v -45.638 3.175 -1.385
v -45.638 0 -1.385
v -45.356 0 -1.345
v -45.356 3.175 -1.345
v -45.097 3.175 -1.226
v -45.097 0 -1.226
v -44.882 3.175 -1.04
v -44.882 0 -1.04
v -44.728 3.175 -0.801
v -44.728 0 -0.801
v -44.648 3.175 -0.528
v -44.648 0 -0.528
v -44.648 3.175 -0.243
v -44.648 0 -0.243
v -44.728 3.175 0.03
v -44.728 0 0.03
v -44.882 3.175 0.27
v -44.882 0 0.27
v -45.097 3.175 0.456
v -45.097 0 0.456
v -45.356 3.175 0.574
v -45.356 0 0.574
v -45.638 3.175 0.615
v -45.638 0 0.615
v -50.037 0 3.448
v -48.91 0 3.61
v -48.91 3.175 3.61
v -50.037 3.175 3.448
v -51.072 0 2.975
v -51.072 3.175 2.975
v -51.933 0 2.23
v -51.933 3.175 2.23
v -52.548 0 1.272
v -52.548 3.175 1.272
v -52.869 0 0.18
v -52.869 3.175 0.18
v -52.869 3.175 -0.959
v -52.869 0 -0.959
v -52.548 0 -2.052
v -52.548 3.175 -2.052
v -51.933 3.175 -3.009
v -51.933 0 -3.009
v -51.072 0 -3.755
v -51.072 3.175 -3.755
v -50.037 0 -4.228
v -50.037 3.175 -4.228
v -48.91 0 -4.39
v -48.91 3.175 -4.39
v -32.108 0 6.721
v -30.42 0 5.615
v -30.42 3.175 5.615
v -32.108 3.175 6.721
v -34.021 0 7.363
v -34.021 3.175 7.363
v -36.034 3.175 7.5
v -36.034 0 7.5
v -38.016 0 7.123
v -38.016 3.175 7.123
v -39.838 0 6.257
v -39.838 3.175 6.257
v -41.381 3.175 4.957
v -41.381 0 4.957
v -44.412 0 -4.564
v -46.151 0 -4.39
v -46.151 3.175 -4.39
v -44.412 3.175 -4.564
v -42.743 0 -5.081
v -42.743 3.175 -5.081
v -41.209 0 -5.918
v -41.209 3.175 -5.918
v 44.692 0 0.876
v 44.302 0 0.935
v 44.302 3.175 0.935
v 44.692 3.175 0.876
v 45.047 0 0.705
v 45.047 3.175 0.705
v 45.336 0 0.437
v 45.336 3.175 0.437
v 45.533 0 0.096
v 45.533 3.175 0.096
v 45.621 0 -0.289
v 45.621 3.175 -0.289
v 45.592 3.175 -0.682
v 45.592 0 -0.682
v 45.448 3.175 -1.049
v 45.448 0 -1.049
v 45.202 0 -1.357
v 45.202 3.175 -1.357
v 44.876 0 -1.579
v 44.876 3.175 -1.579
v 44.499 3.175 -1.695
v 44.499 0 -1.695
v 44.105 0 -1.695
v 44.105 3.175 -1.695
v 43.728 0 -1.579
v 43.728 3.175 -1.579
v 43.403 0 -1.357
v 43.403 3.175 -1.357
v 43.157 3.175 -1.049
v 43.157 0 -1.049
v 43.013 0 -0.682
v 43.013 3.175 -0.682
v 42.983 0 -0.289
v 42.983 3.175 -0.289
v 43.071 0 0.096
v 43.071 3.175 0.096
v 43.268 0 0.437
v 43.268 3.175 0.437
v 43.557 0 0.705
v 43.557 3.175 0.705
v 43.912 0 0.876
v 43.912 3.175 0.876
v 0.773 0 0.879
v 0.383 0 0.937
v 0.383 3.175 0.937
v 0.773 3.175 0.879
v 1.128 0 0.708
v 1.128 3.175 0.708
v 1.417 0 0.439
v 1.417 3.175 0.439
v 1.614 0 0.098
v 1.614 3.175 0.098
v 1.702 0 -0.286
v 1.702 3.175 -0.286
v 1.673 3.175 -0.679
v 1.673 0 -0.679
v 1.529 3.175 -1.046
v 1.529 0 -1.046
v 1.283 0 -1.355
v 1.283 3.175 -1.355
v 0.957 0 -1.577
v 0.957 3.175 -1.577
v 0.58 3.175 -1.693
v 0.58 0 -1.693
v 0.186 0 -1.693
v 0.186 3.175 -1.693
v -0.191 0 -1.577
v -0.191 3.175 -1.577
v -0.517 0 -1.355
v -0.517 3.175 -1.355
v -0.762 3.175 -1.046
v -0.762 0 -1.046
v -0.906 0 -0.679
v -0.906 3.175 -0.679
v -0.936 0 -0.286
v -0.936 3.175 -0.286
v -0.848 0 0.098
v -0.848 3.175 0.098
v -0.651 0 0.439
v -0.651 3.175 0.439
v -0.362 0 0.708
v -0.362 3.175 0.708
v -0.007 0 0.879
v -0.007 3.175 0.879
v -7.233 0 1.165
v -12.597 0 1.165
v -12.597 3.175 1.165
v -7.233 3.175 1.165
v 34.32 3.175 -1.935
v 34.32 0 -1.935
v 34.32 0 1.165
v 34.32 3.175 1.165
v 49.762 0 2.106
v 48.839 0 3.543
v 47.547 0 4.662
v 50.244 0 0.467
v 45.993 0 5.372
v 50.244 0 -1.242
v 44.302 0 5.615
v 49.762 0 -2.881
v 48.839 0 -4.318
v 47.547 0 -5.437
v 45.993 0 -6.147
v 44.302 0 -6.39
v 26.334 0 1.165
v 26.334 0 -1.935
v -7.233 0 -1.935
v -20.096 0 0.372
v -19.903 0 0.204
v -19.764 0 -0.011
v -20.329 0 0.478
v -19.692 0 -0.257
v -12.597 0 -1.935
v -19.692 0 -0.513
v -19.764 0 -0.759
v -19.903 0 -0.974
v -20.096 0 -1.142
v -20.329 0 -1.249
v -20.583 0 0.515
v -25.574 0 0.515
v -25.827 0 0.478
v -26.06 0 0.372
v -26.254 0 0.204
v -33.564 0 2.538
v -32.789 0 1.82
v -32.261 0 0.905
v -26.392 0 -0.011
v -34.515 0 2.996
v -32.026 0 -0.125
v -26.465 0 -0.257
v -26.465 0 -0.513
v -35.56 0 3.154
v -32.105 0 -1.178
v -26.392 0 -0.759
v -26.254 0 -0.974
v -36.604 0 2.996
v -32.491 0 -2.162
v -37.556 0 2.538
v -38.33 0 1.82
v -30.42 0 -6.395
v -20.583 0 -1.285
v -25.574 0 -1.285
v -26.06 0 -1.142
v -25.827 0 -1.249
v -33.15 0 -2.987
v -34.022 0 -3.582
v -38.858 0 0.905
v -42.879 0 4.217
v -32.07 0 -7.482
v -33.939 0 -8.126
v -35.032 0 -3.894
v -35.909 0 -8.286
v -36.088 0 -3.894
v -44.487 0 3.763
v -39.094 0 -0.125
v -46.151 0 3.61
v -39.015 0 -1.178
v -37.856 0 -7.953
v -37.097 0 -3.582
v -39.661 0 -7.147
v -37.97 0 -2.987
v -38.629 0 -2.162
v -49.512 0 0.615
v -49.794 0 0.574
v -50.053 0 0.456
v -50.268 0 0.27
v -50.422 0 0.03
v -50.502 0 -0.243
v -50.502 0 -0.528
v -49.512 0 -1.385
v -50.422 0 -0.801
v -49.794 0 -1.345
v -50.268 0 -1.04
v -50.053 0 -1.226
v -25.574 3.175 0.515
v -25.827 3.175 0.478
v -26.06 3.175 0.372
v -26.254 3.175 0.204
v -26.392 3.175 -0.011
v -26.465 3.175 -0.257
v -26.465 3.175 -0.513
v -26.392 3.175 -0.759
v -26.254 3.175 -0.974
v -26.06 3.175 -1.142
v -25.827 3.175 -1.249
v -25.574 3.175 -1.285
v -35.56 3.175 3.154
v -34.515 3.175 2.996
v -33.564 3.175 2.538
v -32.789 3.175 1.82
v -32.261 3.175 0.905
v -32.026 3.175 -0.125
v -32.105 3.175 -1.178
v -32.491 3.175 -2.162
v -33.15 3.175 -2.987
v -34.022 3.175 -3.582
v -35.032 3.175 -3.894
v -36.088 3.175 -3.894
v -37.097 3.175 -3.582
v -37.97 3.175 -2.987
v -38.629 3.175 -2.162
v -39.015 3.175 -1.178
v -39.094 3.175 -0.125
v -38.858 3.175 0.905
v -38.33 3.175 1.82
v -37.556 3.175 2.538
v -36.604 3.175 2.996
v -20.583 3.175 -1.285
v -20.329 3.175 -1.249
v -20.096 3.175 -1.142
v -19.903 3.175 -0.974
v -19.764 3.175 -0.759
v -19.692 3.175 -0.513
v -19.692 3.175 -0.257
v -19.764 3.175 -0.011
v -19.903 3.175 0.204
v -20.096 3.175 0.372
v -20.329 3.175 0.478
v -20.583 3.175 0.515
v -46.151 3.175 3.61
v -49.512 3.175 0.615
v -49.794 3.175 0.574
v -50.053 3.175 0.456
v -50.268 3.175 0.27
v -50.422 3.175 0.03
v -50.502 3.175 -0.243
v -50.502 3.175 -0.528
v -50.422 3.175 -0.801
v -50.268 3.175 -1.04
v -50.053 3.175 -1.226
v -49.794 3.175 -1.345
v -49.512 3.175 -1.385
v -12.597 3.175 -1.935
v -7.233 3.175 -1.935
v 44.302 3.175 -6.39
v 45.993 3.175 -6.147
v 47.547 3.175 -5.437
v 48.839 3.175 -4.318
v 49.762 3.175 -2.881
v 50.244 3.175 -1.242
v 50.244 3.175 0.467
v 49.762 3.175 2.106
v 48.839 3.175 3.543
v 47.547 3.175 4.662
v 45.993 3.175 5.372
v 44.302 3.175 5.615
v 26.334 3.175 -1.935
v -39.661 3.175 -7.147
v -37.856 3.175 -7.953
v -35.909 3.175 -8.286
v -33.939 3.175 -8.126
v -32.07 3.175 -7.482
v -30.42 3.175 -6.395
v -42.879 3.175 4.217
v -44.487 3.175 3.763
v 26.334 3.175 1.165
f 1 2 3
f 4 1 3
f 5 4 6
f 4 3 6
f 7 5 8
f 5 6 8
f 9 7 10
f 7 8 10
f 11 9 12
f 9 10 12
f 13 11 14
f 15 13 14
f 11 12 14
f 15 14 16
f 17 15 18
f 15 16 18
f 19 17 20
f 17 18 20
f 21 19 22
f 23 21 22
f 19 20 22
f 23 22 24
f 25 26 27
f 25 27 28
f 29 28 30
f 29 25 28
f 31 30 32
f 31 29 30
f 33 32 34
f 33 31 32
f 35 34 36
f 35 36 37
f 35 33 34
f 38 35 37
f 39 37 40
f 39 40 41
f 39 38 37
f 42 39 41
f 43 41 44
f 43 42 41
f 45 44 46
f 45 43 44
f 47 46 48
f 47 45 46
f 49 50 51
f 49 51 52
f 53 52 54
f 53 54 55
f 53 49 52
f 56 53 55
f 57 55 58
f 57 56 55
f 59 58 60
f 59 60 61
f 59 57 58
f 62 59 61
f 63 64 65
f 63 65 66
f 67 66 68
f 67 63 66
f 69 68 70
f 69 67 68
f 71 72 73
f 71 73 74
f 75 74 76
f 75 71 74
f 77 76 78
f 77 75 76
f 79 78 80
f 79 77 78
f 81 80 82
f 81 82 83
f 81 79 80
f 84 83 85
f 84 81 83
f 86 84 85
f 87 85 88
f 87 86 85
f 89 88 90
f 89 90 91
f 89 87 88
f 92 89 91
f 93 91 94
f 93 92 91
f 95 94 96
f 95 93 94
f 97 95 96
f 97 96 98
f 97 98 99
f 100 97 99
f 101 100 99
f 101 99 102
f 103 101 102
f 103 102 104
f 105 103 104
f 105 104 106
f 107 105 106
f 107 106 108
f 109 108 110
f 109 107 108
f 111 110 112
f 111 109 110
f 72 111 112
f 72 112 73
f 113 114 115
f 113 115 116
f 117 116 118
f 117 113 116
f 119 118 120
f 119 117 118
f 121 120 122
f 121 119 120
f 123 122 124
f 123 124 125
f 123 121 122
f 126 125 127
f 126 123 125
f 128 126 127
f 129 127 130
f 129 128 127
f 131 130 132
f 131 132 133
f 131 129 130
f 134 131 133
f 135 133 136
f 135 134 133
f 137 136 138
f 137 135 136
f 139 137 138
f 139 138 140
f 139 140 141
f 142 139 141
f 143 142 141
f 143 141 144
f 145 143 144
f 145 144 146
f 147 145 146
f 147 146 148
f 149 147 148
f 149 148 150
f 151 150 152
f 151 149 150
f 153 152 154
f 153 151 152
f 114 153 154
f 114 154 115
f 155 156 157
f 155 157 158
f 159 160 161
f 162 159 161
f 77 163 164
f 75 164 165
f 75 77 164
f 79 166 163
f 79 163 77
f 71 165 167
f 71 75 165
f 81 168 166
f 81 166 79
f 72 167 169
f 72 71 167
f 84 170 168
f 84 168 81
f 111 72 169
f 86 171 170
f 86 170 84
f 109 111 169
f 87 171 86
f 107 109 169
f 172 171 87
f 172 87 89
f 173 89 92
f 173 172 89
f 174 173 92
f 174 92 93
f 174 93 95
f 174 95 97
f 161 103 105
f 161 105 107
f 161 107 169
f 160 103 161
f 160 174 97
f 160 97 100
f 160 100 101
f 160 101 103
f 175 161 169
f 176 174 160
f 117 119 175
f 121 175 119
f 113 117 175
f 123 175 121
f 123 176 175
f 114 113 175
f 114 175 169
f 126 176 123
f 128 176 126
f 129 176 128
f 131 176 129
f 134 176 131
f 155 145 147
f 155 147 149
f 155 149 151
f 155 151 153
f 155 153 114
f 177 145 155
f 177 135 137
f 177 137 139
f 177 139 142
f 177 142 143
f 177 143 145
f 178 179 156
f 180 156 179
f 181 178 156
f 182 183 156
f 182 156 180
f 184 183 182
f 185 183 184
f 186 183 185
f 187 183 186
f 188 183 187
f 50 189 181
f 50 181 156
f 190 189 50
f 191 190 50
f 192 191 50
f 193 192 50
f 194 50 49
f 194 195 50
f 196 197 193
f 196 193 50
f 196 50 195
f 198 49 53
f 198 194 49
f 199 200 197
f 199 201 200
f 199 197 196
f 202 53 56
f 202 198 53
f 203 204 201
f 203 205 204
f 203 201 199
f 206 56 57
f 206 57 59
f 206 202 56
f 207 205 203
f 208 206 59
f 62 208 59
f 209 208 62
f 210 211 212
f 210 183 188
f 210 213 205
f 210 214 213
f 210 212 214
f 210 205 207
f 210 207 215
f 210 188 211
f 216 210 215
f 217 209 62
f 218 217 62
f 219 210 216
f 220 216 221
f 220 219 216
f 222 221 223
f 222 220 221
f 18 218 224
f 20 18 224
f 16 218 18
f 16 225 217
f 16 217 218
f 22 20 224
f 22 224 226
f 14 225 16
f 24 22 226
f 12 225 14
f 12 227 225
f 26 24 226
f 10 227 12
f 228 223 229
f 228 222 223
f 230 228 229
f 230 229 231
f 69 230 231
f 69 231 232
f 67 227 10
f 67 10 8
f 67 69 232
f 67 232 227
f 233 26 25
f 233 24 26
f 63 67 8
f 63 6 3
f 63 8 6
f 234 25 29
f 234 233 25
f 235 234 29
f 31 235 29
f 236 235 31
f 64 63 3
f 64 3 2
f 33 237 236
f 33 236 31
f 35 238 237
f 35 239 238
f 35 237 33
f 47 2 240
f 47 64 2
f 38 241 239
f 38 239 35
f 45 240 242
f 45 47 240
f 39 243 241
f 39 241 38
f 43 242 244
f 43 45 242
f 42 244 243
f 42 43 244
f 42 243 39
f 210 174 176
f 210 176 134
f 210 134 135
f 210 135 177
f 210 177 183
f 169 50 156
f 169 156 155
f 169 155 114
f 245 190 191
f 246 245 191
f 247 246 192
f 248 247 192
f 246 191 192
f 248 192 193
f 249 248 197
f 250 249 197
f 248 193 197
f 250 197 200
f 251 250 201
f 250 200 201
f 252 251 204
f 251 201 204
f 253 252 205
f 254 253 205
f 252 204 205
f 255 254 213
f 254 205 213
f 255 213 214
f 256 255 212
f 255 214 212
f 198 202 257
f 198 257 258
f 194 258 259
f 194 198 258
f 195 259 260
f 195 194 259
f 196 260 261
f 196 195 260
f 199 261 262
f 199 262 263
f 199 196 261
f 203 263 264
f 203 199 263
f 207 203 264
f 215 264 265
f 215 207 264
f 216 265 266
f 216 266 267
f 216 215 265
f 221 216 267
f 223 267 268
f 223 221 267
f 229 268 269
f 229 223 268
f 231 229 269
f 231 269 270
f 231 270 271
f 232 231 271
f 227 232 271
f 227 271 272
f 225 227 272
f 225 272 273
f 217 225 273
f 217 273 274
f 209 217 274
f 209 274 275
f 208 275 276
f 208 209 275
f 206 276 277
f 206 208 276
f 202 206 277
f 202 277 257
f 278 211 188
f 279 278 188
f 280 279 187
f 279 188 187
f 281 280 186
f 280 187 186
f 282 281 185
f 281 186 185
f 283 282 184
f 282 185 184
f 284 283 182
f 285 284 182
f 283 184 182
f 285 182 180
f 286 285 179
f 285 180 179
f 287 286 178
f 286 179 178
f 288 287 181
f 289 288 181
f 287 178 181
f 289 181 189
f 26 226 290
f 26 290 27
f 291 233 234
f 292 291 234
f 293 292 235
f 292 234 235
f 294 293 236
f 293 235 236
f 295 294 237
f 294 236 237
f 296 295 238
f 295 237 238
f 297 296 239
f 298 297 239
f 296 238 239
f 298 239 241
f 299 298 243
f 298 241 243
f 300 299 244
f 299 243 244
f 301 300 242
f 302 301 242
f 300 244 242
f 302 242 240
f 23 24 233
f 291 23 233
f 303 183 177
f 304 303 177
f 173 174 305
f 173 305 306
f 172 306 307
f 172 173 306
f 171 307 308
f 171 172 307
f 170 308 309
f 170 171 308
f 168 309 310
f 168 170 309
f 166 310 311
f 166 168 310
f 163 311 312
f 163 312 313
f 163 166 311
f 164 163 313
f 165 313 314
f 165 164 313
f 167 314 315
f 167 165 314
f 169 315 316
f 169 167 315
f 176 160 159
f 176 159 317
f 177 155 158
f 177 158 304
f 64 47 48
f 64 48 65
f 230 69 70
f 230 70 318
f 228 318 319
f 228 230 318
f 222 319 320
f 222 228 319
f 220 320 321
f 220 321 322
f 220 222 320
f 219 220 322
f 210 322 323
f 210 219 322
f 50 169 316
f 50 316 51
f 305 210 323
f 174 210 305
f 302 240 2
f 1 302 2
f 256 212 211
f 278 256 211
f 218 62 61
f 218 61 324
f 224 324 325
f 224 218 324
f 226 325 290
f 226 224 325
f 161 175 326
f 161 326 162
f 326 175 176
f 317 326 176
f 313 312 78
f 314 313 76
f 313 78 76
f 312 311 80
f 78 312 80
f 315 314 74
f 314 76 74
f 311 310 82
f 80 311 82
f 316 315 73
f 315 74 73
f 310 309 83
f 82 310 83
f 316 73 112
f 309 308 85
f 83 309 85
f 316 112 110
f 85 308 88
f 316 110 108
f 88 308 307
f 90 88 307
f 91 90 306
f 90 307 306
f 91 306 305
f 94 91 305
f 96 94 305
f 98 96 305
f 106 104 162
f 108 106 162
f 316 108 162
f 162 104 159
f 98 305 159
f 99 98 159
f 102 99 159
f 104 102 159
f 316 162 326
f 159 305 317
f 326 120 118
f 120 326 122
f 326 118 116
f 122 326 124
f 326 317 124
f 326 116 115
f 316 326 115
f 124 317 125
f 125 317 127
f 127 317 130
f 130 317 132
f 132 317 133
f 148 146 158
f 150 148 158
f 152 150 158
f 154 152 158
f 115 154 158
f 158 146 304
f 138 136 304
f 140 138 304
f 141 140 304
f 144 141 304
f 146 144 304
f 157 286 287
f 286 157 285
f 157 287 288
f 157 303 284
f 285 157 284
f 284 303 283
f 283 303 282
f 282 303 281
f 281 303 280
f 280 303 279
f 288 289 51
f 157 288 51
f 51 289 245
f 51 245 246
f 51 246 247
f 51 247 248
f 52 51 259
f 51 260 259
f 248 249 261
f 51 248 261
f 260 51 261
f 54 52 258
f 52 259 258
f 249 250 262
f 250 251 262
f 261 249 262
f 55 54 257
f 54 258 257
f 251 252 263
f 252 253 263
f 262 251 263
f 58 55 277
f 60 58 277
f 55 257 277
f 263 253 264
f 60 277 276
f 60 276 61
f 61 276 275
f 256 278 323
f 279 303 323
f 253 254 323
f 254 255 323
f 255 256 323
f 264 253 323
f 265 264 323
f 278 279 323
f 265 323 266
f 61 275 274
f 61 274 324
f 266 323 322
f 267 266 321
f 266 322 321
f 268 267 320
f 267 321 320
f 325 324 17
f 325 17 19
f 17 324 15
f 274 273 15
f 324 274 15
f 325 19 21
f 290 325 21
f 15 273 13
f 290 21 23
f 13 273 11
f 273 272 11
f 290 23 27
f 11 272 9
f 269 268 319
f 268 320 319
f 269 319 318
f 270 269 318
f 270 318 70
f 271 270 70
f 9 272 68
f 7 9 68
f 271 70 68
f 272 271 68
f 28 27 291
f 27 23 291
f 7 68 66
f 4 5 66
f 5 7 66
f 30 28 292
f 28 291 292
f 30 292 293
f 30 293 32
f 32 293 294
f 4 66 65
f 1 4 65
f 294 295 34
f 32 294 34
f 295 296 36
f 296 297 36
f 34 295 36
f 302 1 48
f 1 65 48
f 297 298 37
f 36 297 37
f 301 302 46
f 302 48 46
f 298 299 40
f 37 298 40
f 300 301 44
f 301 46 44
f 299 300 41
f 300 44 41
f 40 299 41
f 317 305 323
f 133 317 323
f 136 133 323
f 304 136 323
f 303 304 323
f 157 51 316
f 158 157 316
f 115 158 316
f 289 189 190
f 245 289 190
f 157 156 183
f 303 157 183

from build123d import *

# Parameters (mm, degrees)
SKETCH1_R           = 1.322622219
SKETCH1_R_2         = 3.543581518
SKETCH1_W           = 5.363642664
SKETCH1_H           = 3.09972609
BOSS_EXTRUDE1_DEPTH = 3.175


with BuildPart() as part:
    # Sketch1 → Boss-Extrude1 (new body)
    with BuildSketch(Plane(origin=(0, 0, 0), x_dir=(1, 0, 0), z_dir=(0, 1, 0))):
        with BuildLine():
            Line((-30.420224954, 6.394505262), (44.302185909, 6.390032423))
            ThreePointArc((44.302185909, 6.390032423), (50.304735151, 0.387483181), (44.302185909, -5.61506606))
            Line((44.302185909, -5.61506606), (-30.420308604, -5.61506606))
            ThreePointArc((-30.420308604, -5.61506606), (-36.033562007, -7.500021548), (-41.380965097, -4.957001462))
            ThreePointArc((-41.380965097, -4.957001462), (-43.672708861, -3.953506377), (-46.150888165, -3.610404055))
            Line((-46.150888165, -3.610404055), (-48.909665253, -3.610404055))
            ThreePointArc((-48.909665253, -3.610404055), (-52.90984424, 0.389774933), (-48.909665253, 4.38995392))
            Line((-48.909665253, 4.38995392), (-46.150888165, 4.38995392))
            ThreePointArc((-46.150888165, 4.38995392), (-43.564402624, 4.780712621), (-41.208786399, 5.918109658))
            ThreePointArc((-41.208786399, 5.918109658), (-35.908549497, 8.286044856), (-30.420224954, 6.394505262))
        make_face()
        with Locations(Location((44.302185909, 0.387483181, 0), (0, 0, 270))):
            Circle(SKETCH1_R, mode=Mode.SUBTRACT)
        with Locations(Location((0.383109325, 0.385153592, 0), (0, 0, 270))):
            Circle(SKETCH1_R, mode=Mode.SUBTRACT)
        with Locations(Location((-35.559869313, 0.389755399, 0), (0, 0, 270))):
            Circle(SKETCH1_R_2, mode=Mode.SUBTRACT)
        Polygon((34.320012777, 1.885218269), (34.320012777, 1.935143597), (26.334122715, 1.935143597), (26.334122715, 1.885218269), (26.334122715, -1.114852491), (26.334122715, -1.164973144), (34.320012777, -1.164973144), (34.320012777, -1.114852491), align=None, mode=Mode.SUBTRACT)
        with Locations((-9.914943428, 0.385085228)):
            Rectangle(SKETCH1_W, SKETCH1_H, mode=Mode.SUBTRACT)
        with BuildLine():
            Line((-20.582664571, -0.514889121), (-25.573840985, -0.514889121))
            ThreePointArc((-25.573840985, -0.514889121), (-26.473815335, 0.385085229), (-25.573840985, 1.285059578))
            Line((-25.573840985, 1.285059578), (-20.582664571, 1.285059578))
            ThreePointArc((-20.582664571, 1.285059578), (-19.682690221, 0.385085229), (-20.582664571, -0.514889121))
        make_face(mode=Mode.SUBTRACT)
        with BuildLine():
            Line((-49.512218616, 1.385222757), (-45.638080248, 1.385222757))
            ThreePointArc((-45.638080248, 1.385222757), (-44.638040384, 0.385182893), (-45.638080248, -0.614856971))
            Line((-45.638080248, -0.614856971), (-49.512218616, -0.614856971))
            ThreePointArc((-49.512218616, -0.614856971), (-50.51225848, 0.385182893), (-49.512218616, 1.385222757))
        make_face(mode=Mode.SUBTRACT)
    extrude(amount=BOSS_EXTRUDE1_DEPTH)


solid = part.part
